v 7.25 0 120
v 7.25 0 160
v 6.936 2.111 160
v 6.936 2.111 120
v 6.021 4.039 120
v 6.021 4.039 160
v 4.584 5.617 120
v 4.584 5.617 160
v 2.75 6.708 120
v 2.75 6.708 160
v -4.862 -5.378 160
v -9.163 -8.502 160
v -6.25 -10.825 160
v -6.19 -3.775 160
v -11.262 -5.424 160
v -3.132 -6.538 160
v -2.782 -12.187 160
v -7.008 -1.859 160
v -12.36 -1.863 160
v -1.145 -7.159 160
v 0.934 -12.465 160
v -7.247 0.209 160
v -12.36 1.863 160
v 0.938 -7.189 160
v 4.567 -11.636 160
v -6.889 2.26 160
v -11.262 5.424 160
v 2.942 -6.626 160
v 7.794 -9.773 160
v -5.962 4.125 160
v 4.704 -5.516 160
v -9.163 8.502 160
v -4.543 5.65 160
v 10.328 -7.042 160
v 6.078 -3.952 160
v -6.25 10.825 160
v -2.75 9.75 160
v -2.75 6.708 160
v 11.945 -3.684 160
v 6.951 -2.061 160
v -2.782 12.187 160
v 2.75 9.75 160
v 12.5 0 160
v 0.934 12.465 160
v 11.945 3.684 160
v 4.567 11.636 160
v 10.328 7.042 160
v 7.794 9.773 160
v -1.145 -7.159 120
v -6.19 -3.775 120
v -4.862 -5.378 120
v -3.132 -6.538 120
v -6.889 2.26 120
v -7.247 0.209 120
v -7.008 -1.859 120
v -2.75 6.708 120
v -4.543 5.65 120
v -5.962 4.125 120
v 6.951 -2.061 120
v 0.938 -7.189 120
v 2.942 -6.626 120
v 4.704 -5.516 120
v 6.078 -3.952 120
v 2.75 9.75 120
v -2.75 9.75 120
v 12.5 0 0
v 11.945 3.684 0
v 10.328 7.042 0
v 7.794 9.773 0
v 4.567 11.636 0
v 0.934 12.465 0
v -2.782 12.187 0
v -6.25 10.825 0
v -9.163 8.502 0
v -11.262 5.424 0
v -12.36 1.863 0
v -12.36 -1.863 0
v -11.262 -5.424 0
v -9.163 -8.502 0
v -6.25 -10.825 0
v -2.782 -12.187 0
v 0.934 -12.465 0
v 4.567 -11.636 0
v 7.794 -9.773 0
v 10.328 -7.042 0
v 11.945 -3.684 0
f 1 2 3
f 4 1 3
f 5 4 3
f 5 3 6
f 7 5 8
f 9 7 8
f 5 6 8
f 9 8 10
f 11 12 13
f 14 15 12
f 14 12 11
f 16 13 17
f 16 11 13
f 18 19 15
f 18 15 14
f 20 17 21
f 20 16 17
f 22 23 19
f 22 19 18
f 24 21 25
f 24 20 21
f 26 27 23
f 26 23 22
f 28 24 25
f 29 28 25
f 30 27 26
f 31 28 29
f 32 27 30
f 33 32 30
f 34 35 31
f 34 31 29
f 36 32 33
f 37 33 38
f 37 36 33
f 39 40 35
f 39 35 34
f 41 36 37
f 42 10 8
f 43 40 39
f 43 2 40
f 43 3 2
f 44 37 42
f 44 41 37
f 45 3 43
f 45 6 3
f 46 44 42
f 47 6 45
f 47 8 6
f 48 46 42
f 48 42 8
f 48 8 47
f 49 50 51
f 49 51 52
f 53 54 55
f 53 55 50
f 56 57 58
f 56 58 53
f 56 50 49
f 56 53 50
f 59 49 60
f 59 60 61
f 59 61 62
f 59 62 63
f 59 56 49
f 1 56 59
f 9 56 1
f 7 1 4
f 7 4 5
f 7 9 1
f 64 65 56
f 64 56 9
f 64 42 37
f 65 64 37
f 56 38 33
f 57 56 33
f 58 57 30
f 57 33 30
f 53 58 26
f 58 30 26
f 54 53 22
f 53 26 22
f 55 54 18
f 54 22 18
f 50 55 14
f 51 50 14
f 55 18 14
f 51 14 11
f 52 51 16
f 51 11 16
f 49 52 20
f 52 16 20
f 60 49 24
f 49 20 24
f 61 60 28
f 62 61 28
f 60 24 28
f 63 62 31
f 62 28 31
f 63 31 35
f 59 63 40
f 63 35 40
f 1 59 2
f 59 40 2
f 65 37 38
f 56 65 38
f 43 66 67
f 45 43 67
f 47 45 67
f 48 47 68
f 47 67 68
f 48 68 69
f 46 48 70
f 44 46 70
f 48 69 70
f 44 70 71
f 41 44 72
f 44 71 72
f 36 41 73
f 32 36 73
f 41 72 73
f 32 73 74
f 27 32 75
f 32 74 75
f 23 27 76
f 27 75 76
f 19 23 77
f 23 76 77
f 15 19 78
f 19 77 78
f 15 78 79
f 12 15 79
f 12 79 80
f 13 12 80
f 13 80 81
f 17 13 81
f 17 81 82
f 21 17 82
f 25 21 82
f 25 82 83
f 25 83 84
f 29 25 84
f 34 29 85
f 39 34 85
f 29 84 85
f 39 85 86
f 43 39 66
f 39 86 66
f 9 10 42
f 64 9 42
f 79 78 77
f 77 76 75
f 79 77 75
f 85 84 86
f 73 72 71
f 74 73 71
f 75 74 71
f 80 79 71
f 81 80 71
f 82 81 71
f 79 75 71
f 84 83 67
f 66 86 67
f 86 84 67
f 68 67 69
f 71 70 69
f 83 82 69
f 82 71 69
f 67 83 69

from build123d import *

# Parameters (mm, degrees)
F0_R     = 12.5
F1_DEPTH = 160
F3_DEPTH = 40


# Not quite as in the source:
# - a feature names something its author has since deleted; it is built from what else it names


with BuildPart() as f1:
    # F0 (on Top) → F1 (new body)
    with BuildSketch(Plane.XY):
        Circle(F0_R)
    extrude(amount=F1_DEPTH)

    # F2 (on face) → F3 (cut)
    with BuildSketch(Plane.XY.offset(160)):
        with BuildLine():
            ThreePointArc((-2.75, 6.7082039325), (-4.0388736054, -6.0207972894), (7.25, 0))
            ThreePointArc((7.25, 0), (6.0207972894, 4.0388736054), (2.75, 6.7082039325))
            Line((2.75, 6.7082039325), (2.75, 4.75))
            Line((2.75, 4.75), (-2.75, 4.75))
            Line((-2.75, 4.75), (-2.75, 6.7082039325))
        make_face()
        with BuildLine():
            Line((2.75, 4.75), (2.75, 6.7082039325))
            ThreePointArc((2.75, 6.7082039325), (0, 7.25), (-2.75, 6.7082039325))
            Line((-2.75, 6.7082039325), (-2.75, 4.75))
            Line((-2.75, 4.75), (2.75, 4.75))
        make_face()
        with BuildLine():
            ThreePointArc((-2.75, 6.7082039325), (0, 7.25), (2.75, 6.7082039325))
            Line((2.75, 6.7082039325), (2.75, 9.75))
            Line((2.75, 9.75), (-2.75, 9.75))
            Line((-2.75, 9.75), (-2.75, 6.7082039325))
        make_face()
    extrude(amount=-F3_DEPTH, mode=Mode.SUBTRACT)


solid = f1.part
